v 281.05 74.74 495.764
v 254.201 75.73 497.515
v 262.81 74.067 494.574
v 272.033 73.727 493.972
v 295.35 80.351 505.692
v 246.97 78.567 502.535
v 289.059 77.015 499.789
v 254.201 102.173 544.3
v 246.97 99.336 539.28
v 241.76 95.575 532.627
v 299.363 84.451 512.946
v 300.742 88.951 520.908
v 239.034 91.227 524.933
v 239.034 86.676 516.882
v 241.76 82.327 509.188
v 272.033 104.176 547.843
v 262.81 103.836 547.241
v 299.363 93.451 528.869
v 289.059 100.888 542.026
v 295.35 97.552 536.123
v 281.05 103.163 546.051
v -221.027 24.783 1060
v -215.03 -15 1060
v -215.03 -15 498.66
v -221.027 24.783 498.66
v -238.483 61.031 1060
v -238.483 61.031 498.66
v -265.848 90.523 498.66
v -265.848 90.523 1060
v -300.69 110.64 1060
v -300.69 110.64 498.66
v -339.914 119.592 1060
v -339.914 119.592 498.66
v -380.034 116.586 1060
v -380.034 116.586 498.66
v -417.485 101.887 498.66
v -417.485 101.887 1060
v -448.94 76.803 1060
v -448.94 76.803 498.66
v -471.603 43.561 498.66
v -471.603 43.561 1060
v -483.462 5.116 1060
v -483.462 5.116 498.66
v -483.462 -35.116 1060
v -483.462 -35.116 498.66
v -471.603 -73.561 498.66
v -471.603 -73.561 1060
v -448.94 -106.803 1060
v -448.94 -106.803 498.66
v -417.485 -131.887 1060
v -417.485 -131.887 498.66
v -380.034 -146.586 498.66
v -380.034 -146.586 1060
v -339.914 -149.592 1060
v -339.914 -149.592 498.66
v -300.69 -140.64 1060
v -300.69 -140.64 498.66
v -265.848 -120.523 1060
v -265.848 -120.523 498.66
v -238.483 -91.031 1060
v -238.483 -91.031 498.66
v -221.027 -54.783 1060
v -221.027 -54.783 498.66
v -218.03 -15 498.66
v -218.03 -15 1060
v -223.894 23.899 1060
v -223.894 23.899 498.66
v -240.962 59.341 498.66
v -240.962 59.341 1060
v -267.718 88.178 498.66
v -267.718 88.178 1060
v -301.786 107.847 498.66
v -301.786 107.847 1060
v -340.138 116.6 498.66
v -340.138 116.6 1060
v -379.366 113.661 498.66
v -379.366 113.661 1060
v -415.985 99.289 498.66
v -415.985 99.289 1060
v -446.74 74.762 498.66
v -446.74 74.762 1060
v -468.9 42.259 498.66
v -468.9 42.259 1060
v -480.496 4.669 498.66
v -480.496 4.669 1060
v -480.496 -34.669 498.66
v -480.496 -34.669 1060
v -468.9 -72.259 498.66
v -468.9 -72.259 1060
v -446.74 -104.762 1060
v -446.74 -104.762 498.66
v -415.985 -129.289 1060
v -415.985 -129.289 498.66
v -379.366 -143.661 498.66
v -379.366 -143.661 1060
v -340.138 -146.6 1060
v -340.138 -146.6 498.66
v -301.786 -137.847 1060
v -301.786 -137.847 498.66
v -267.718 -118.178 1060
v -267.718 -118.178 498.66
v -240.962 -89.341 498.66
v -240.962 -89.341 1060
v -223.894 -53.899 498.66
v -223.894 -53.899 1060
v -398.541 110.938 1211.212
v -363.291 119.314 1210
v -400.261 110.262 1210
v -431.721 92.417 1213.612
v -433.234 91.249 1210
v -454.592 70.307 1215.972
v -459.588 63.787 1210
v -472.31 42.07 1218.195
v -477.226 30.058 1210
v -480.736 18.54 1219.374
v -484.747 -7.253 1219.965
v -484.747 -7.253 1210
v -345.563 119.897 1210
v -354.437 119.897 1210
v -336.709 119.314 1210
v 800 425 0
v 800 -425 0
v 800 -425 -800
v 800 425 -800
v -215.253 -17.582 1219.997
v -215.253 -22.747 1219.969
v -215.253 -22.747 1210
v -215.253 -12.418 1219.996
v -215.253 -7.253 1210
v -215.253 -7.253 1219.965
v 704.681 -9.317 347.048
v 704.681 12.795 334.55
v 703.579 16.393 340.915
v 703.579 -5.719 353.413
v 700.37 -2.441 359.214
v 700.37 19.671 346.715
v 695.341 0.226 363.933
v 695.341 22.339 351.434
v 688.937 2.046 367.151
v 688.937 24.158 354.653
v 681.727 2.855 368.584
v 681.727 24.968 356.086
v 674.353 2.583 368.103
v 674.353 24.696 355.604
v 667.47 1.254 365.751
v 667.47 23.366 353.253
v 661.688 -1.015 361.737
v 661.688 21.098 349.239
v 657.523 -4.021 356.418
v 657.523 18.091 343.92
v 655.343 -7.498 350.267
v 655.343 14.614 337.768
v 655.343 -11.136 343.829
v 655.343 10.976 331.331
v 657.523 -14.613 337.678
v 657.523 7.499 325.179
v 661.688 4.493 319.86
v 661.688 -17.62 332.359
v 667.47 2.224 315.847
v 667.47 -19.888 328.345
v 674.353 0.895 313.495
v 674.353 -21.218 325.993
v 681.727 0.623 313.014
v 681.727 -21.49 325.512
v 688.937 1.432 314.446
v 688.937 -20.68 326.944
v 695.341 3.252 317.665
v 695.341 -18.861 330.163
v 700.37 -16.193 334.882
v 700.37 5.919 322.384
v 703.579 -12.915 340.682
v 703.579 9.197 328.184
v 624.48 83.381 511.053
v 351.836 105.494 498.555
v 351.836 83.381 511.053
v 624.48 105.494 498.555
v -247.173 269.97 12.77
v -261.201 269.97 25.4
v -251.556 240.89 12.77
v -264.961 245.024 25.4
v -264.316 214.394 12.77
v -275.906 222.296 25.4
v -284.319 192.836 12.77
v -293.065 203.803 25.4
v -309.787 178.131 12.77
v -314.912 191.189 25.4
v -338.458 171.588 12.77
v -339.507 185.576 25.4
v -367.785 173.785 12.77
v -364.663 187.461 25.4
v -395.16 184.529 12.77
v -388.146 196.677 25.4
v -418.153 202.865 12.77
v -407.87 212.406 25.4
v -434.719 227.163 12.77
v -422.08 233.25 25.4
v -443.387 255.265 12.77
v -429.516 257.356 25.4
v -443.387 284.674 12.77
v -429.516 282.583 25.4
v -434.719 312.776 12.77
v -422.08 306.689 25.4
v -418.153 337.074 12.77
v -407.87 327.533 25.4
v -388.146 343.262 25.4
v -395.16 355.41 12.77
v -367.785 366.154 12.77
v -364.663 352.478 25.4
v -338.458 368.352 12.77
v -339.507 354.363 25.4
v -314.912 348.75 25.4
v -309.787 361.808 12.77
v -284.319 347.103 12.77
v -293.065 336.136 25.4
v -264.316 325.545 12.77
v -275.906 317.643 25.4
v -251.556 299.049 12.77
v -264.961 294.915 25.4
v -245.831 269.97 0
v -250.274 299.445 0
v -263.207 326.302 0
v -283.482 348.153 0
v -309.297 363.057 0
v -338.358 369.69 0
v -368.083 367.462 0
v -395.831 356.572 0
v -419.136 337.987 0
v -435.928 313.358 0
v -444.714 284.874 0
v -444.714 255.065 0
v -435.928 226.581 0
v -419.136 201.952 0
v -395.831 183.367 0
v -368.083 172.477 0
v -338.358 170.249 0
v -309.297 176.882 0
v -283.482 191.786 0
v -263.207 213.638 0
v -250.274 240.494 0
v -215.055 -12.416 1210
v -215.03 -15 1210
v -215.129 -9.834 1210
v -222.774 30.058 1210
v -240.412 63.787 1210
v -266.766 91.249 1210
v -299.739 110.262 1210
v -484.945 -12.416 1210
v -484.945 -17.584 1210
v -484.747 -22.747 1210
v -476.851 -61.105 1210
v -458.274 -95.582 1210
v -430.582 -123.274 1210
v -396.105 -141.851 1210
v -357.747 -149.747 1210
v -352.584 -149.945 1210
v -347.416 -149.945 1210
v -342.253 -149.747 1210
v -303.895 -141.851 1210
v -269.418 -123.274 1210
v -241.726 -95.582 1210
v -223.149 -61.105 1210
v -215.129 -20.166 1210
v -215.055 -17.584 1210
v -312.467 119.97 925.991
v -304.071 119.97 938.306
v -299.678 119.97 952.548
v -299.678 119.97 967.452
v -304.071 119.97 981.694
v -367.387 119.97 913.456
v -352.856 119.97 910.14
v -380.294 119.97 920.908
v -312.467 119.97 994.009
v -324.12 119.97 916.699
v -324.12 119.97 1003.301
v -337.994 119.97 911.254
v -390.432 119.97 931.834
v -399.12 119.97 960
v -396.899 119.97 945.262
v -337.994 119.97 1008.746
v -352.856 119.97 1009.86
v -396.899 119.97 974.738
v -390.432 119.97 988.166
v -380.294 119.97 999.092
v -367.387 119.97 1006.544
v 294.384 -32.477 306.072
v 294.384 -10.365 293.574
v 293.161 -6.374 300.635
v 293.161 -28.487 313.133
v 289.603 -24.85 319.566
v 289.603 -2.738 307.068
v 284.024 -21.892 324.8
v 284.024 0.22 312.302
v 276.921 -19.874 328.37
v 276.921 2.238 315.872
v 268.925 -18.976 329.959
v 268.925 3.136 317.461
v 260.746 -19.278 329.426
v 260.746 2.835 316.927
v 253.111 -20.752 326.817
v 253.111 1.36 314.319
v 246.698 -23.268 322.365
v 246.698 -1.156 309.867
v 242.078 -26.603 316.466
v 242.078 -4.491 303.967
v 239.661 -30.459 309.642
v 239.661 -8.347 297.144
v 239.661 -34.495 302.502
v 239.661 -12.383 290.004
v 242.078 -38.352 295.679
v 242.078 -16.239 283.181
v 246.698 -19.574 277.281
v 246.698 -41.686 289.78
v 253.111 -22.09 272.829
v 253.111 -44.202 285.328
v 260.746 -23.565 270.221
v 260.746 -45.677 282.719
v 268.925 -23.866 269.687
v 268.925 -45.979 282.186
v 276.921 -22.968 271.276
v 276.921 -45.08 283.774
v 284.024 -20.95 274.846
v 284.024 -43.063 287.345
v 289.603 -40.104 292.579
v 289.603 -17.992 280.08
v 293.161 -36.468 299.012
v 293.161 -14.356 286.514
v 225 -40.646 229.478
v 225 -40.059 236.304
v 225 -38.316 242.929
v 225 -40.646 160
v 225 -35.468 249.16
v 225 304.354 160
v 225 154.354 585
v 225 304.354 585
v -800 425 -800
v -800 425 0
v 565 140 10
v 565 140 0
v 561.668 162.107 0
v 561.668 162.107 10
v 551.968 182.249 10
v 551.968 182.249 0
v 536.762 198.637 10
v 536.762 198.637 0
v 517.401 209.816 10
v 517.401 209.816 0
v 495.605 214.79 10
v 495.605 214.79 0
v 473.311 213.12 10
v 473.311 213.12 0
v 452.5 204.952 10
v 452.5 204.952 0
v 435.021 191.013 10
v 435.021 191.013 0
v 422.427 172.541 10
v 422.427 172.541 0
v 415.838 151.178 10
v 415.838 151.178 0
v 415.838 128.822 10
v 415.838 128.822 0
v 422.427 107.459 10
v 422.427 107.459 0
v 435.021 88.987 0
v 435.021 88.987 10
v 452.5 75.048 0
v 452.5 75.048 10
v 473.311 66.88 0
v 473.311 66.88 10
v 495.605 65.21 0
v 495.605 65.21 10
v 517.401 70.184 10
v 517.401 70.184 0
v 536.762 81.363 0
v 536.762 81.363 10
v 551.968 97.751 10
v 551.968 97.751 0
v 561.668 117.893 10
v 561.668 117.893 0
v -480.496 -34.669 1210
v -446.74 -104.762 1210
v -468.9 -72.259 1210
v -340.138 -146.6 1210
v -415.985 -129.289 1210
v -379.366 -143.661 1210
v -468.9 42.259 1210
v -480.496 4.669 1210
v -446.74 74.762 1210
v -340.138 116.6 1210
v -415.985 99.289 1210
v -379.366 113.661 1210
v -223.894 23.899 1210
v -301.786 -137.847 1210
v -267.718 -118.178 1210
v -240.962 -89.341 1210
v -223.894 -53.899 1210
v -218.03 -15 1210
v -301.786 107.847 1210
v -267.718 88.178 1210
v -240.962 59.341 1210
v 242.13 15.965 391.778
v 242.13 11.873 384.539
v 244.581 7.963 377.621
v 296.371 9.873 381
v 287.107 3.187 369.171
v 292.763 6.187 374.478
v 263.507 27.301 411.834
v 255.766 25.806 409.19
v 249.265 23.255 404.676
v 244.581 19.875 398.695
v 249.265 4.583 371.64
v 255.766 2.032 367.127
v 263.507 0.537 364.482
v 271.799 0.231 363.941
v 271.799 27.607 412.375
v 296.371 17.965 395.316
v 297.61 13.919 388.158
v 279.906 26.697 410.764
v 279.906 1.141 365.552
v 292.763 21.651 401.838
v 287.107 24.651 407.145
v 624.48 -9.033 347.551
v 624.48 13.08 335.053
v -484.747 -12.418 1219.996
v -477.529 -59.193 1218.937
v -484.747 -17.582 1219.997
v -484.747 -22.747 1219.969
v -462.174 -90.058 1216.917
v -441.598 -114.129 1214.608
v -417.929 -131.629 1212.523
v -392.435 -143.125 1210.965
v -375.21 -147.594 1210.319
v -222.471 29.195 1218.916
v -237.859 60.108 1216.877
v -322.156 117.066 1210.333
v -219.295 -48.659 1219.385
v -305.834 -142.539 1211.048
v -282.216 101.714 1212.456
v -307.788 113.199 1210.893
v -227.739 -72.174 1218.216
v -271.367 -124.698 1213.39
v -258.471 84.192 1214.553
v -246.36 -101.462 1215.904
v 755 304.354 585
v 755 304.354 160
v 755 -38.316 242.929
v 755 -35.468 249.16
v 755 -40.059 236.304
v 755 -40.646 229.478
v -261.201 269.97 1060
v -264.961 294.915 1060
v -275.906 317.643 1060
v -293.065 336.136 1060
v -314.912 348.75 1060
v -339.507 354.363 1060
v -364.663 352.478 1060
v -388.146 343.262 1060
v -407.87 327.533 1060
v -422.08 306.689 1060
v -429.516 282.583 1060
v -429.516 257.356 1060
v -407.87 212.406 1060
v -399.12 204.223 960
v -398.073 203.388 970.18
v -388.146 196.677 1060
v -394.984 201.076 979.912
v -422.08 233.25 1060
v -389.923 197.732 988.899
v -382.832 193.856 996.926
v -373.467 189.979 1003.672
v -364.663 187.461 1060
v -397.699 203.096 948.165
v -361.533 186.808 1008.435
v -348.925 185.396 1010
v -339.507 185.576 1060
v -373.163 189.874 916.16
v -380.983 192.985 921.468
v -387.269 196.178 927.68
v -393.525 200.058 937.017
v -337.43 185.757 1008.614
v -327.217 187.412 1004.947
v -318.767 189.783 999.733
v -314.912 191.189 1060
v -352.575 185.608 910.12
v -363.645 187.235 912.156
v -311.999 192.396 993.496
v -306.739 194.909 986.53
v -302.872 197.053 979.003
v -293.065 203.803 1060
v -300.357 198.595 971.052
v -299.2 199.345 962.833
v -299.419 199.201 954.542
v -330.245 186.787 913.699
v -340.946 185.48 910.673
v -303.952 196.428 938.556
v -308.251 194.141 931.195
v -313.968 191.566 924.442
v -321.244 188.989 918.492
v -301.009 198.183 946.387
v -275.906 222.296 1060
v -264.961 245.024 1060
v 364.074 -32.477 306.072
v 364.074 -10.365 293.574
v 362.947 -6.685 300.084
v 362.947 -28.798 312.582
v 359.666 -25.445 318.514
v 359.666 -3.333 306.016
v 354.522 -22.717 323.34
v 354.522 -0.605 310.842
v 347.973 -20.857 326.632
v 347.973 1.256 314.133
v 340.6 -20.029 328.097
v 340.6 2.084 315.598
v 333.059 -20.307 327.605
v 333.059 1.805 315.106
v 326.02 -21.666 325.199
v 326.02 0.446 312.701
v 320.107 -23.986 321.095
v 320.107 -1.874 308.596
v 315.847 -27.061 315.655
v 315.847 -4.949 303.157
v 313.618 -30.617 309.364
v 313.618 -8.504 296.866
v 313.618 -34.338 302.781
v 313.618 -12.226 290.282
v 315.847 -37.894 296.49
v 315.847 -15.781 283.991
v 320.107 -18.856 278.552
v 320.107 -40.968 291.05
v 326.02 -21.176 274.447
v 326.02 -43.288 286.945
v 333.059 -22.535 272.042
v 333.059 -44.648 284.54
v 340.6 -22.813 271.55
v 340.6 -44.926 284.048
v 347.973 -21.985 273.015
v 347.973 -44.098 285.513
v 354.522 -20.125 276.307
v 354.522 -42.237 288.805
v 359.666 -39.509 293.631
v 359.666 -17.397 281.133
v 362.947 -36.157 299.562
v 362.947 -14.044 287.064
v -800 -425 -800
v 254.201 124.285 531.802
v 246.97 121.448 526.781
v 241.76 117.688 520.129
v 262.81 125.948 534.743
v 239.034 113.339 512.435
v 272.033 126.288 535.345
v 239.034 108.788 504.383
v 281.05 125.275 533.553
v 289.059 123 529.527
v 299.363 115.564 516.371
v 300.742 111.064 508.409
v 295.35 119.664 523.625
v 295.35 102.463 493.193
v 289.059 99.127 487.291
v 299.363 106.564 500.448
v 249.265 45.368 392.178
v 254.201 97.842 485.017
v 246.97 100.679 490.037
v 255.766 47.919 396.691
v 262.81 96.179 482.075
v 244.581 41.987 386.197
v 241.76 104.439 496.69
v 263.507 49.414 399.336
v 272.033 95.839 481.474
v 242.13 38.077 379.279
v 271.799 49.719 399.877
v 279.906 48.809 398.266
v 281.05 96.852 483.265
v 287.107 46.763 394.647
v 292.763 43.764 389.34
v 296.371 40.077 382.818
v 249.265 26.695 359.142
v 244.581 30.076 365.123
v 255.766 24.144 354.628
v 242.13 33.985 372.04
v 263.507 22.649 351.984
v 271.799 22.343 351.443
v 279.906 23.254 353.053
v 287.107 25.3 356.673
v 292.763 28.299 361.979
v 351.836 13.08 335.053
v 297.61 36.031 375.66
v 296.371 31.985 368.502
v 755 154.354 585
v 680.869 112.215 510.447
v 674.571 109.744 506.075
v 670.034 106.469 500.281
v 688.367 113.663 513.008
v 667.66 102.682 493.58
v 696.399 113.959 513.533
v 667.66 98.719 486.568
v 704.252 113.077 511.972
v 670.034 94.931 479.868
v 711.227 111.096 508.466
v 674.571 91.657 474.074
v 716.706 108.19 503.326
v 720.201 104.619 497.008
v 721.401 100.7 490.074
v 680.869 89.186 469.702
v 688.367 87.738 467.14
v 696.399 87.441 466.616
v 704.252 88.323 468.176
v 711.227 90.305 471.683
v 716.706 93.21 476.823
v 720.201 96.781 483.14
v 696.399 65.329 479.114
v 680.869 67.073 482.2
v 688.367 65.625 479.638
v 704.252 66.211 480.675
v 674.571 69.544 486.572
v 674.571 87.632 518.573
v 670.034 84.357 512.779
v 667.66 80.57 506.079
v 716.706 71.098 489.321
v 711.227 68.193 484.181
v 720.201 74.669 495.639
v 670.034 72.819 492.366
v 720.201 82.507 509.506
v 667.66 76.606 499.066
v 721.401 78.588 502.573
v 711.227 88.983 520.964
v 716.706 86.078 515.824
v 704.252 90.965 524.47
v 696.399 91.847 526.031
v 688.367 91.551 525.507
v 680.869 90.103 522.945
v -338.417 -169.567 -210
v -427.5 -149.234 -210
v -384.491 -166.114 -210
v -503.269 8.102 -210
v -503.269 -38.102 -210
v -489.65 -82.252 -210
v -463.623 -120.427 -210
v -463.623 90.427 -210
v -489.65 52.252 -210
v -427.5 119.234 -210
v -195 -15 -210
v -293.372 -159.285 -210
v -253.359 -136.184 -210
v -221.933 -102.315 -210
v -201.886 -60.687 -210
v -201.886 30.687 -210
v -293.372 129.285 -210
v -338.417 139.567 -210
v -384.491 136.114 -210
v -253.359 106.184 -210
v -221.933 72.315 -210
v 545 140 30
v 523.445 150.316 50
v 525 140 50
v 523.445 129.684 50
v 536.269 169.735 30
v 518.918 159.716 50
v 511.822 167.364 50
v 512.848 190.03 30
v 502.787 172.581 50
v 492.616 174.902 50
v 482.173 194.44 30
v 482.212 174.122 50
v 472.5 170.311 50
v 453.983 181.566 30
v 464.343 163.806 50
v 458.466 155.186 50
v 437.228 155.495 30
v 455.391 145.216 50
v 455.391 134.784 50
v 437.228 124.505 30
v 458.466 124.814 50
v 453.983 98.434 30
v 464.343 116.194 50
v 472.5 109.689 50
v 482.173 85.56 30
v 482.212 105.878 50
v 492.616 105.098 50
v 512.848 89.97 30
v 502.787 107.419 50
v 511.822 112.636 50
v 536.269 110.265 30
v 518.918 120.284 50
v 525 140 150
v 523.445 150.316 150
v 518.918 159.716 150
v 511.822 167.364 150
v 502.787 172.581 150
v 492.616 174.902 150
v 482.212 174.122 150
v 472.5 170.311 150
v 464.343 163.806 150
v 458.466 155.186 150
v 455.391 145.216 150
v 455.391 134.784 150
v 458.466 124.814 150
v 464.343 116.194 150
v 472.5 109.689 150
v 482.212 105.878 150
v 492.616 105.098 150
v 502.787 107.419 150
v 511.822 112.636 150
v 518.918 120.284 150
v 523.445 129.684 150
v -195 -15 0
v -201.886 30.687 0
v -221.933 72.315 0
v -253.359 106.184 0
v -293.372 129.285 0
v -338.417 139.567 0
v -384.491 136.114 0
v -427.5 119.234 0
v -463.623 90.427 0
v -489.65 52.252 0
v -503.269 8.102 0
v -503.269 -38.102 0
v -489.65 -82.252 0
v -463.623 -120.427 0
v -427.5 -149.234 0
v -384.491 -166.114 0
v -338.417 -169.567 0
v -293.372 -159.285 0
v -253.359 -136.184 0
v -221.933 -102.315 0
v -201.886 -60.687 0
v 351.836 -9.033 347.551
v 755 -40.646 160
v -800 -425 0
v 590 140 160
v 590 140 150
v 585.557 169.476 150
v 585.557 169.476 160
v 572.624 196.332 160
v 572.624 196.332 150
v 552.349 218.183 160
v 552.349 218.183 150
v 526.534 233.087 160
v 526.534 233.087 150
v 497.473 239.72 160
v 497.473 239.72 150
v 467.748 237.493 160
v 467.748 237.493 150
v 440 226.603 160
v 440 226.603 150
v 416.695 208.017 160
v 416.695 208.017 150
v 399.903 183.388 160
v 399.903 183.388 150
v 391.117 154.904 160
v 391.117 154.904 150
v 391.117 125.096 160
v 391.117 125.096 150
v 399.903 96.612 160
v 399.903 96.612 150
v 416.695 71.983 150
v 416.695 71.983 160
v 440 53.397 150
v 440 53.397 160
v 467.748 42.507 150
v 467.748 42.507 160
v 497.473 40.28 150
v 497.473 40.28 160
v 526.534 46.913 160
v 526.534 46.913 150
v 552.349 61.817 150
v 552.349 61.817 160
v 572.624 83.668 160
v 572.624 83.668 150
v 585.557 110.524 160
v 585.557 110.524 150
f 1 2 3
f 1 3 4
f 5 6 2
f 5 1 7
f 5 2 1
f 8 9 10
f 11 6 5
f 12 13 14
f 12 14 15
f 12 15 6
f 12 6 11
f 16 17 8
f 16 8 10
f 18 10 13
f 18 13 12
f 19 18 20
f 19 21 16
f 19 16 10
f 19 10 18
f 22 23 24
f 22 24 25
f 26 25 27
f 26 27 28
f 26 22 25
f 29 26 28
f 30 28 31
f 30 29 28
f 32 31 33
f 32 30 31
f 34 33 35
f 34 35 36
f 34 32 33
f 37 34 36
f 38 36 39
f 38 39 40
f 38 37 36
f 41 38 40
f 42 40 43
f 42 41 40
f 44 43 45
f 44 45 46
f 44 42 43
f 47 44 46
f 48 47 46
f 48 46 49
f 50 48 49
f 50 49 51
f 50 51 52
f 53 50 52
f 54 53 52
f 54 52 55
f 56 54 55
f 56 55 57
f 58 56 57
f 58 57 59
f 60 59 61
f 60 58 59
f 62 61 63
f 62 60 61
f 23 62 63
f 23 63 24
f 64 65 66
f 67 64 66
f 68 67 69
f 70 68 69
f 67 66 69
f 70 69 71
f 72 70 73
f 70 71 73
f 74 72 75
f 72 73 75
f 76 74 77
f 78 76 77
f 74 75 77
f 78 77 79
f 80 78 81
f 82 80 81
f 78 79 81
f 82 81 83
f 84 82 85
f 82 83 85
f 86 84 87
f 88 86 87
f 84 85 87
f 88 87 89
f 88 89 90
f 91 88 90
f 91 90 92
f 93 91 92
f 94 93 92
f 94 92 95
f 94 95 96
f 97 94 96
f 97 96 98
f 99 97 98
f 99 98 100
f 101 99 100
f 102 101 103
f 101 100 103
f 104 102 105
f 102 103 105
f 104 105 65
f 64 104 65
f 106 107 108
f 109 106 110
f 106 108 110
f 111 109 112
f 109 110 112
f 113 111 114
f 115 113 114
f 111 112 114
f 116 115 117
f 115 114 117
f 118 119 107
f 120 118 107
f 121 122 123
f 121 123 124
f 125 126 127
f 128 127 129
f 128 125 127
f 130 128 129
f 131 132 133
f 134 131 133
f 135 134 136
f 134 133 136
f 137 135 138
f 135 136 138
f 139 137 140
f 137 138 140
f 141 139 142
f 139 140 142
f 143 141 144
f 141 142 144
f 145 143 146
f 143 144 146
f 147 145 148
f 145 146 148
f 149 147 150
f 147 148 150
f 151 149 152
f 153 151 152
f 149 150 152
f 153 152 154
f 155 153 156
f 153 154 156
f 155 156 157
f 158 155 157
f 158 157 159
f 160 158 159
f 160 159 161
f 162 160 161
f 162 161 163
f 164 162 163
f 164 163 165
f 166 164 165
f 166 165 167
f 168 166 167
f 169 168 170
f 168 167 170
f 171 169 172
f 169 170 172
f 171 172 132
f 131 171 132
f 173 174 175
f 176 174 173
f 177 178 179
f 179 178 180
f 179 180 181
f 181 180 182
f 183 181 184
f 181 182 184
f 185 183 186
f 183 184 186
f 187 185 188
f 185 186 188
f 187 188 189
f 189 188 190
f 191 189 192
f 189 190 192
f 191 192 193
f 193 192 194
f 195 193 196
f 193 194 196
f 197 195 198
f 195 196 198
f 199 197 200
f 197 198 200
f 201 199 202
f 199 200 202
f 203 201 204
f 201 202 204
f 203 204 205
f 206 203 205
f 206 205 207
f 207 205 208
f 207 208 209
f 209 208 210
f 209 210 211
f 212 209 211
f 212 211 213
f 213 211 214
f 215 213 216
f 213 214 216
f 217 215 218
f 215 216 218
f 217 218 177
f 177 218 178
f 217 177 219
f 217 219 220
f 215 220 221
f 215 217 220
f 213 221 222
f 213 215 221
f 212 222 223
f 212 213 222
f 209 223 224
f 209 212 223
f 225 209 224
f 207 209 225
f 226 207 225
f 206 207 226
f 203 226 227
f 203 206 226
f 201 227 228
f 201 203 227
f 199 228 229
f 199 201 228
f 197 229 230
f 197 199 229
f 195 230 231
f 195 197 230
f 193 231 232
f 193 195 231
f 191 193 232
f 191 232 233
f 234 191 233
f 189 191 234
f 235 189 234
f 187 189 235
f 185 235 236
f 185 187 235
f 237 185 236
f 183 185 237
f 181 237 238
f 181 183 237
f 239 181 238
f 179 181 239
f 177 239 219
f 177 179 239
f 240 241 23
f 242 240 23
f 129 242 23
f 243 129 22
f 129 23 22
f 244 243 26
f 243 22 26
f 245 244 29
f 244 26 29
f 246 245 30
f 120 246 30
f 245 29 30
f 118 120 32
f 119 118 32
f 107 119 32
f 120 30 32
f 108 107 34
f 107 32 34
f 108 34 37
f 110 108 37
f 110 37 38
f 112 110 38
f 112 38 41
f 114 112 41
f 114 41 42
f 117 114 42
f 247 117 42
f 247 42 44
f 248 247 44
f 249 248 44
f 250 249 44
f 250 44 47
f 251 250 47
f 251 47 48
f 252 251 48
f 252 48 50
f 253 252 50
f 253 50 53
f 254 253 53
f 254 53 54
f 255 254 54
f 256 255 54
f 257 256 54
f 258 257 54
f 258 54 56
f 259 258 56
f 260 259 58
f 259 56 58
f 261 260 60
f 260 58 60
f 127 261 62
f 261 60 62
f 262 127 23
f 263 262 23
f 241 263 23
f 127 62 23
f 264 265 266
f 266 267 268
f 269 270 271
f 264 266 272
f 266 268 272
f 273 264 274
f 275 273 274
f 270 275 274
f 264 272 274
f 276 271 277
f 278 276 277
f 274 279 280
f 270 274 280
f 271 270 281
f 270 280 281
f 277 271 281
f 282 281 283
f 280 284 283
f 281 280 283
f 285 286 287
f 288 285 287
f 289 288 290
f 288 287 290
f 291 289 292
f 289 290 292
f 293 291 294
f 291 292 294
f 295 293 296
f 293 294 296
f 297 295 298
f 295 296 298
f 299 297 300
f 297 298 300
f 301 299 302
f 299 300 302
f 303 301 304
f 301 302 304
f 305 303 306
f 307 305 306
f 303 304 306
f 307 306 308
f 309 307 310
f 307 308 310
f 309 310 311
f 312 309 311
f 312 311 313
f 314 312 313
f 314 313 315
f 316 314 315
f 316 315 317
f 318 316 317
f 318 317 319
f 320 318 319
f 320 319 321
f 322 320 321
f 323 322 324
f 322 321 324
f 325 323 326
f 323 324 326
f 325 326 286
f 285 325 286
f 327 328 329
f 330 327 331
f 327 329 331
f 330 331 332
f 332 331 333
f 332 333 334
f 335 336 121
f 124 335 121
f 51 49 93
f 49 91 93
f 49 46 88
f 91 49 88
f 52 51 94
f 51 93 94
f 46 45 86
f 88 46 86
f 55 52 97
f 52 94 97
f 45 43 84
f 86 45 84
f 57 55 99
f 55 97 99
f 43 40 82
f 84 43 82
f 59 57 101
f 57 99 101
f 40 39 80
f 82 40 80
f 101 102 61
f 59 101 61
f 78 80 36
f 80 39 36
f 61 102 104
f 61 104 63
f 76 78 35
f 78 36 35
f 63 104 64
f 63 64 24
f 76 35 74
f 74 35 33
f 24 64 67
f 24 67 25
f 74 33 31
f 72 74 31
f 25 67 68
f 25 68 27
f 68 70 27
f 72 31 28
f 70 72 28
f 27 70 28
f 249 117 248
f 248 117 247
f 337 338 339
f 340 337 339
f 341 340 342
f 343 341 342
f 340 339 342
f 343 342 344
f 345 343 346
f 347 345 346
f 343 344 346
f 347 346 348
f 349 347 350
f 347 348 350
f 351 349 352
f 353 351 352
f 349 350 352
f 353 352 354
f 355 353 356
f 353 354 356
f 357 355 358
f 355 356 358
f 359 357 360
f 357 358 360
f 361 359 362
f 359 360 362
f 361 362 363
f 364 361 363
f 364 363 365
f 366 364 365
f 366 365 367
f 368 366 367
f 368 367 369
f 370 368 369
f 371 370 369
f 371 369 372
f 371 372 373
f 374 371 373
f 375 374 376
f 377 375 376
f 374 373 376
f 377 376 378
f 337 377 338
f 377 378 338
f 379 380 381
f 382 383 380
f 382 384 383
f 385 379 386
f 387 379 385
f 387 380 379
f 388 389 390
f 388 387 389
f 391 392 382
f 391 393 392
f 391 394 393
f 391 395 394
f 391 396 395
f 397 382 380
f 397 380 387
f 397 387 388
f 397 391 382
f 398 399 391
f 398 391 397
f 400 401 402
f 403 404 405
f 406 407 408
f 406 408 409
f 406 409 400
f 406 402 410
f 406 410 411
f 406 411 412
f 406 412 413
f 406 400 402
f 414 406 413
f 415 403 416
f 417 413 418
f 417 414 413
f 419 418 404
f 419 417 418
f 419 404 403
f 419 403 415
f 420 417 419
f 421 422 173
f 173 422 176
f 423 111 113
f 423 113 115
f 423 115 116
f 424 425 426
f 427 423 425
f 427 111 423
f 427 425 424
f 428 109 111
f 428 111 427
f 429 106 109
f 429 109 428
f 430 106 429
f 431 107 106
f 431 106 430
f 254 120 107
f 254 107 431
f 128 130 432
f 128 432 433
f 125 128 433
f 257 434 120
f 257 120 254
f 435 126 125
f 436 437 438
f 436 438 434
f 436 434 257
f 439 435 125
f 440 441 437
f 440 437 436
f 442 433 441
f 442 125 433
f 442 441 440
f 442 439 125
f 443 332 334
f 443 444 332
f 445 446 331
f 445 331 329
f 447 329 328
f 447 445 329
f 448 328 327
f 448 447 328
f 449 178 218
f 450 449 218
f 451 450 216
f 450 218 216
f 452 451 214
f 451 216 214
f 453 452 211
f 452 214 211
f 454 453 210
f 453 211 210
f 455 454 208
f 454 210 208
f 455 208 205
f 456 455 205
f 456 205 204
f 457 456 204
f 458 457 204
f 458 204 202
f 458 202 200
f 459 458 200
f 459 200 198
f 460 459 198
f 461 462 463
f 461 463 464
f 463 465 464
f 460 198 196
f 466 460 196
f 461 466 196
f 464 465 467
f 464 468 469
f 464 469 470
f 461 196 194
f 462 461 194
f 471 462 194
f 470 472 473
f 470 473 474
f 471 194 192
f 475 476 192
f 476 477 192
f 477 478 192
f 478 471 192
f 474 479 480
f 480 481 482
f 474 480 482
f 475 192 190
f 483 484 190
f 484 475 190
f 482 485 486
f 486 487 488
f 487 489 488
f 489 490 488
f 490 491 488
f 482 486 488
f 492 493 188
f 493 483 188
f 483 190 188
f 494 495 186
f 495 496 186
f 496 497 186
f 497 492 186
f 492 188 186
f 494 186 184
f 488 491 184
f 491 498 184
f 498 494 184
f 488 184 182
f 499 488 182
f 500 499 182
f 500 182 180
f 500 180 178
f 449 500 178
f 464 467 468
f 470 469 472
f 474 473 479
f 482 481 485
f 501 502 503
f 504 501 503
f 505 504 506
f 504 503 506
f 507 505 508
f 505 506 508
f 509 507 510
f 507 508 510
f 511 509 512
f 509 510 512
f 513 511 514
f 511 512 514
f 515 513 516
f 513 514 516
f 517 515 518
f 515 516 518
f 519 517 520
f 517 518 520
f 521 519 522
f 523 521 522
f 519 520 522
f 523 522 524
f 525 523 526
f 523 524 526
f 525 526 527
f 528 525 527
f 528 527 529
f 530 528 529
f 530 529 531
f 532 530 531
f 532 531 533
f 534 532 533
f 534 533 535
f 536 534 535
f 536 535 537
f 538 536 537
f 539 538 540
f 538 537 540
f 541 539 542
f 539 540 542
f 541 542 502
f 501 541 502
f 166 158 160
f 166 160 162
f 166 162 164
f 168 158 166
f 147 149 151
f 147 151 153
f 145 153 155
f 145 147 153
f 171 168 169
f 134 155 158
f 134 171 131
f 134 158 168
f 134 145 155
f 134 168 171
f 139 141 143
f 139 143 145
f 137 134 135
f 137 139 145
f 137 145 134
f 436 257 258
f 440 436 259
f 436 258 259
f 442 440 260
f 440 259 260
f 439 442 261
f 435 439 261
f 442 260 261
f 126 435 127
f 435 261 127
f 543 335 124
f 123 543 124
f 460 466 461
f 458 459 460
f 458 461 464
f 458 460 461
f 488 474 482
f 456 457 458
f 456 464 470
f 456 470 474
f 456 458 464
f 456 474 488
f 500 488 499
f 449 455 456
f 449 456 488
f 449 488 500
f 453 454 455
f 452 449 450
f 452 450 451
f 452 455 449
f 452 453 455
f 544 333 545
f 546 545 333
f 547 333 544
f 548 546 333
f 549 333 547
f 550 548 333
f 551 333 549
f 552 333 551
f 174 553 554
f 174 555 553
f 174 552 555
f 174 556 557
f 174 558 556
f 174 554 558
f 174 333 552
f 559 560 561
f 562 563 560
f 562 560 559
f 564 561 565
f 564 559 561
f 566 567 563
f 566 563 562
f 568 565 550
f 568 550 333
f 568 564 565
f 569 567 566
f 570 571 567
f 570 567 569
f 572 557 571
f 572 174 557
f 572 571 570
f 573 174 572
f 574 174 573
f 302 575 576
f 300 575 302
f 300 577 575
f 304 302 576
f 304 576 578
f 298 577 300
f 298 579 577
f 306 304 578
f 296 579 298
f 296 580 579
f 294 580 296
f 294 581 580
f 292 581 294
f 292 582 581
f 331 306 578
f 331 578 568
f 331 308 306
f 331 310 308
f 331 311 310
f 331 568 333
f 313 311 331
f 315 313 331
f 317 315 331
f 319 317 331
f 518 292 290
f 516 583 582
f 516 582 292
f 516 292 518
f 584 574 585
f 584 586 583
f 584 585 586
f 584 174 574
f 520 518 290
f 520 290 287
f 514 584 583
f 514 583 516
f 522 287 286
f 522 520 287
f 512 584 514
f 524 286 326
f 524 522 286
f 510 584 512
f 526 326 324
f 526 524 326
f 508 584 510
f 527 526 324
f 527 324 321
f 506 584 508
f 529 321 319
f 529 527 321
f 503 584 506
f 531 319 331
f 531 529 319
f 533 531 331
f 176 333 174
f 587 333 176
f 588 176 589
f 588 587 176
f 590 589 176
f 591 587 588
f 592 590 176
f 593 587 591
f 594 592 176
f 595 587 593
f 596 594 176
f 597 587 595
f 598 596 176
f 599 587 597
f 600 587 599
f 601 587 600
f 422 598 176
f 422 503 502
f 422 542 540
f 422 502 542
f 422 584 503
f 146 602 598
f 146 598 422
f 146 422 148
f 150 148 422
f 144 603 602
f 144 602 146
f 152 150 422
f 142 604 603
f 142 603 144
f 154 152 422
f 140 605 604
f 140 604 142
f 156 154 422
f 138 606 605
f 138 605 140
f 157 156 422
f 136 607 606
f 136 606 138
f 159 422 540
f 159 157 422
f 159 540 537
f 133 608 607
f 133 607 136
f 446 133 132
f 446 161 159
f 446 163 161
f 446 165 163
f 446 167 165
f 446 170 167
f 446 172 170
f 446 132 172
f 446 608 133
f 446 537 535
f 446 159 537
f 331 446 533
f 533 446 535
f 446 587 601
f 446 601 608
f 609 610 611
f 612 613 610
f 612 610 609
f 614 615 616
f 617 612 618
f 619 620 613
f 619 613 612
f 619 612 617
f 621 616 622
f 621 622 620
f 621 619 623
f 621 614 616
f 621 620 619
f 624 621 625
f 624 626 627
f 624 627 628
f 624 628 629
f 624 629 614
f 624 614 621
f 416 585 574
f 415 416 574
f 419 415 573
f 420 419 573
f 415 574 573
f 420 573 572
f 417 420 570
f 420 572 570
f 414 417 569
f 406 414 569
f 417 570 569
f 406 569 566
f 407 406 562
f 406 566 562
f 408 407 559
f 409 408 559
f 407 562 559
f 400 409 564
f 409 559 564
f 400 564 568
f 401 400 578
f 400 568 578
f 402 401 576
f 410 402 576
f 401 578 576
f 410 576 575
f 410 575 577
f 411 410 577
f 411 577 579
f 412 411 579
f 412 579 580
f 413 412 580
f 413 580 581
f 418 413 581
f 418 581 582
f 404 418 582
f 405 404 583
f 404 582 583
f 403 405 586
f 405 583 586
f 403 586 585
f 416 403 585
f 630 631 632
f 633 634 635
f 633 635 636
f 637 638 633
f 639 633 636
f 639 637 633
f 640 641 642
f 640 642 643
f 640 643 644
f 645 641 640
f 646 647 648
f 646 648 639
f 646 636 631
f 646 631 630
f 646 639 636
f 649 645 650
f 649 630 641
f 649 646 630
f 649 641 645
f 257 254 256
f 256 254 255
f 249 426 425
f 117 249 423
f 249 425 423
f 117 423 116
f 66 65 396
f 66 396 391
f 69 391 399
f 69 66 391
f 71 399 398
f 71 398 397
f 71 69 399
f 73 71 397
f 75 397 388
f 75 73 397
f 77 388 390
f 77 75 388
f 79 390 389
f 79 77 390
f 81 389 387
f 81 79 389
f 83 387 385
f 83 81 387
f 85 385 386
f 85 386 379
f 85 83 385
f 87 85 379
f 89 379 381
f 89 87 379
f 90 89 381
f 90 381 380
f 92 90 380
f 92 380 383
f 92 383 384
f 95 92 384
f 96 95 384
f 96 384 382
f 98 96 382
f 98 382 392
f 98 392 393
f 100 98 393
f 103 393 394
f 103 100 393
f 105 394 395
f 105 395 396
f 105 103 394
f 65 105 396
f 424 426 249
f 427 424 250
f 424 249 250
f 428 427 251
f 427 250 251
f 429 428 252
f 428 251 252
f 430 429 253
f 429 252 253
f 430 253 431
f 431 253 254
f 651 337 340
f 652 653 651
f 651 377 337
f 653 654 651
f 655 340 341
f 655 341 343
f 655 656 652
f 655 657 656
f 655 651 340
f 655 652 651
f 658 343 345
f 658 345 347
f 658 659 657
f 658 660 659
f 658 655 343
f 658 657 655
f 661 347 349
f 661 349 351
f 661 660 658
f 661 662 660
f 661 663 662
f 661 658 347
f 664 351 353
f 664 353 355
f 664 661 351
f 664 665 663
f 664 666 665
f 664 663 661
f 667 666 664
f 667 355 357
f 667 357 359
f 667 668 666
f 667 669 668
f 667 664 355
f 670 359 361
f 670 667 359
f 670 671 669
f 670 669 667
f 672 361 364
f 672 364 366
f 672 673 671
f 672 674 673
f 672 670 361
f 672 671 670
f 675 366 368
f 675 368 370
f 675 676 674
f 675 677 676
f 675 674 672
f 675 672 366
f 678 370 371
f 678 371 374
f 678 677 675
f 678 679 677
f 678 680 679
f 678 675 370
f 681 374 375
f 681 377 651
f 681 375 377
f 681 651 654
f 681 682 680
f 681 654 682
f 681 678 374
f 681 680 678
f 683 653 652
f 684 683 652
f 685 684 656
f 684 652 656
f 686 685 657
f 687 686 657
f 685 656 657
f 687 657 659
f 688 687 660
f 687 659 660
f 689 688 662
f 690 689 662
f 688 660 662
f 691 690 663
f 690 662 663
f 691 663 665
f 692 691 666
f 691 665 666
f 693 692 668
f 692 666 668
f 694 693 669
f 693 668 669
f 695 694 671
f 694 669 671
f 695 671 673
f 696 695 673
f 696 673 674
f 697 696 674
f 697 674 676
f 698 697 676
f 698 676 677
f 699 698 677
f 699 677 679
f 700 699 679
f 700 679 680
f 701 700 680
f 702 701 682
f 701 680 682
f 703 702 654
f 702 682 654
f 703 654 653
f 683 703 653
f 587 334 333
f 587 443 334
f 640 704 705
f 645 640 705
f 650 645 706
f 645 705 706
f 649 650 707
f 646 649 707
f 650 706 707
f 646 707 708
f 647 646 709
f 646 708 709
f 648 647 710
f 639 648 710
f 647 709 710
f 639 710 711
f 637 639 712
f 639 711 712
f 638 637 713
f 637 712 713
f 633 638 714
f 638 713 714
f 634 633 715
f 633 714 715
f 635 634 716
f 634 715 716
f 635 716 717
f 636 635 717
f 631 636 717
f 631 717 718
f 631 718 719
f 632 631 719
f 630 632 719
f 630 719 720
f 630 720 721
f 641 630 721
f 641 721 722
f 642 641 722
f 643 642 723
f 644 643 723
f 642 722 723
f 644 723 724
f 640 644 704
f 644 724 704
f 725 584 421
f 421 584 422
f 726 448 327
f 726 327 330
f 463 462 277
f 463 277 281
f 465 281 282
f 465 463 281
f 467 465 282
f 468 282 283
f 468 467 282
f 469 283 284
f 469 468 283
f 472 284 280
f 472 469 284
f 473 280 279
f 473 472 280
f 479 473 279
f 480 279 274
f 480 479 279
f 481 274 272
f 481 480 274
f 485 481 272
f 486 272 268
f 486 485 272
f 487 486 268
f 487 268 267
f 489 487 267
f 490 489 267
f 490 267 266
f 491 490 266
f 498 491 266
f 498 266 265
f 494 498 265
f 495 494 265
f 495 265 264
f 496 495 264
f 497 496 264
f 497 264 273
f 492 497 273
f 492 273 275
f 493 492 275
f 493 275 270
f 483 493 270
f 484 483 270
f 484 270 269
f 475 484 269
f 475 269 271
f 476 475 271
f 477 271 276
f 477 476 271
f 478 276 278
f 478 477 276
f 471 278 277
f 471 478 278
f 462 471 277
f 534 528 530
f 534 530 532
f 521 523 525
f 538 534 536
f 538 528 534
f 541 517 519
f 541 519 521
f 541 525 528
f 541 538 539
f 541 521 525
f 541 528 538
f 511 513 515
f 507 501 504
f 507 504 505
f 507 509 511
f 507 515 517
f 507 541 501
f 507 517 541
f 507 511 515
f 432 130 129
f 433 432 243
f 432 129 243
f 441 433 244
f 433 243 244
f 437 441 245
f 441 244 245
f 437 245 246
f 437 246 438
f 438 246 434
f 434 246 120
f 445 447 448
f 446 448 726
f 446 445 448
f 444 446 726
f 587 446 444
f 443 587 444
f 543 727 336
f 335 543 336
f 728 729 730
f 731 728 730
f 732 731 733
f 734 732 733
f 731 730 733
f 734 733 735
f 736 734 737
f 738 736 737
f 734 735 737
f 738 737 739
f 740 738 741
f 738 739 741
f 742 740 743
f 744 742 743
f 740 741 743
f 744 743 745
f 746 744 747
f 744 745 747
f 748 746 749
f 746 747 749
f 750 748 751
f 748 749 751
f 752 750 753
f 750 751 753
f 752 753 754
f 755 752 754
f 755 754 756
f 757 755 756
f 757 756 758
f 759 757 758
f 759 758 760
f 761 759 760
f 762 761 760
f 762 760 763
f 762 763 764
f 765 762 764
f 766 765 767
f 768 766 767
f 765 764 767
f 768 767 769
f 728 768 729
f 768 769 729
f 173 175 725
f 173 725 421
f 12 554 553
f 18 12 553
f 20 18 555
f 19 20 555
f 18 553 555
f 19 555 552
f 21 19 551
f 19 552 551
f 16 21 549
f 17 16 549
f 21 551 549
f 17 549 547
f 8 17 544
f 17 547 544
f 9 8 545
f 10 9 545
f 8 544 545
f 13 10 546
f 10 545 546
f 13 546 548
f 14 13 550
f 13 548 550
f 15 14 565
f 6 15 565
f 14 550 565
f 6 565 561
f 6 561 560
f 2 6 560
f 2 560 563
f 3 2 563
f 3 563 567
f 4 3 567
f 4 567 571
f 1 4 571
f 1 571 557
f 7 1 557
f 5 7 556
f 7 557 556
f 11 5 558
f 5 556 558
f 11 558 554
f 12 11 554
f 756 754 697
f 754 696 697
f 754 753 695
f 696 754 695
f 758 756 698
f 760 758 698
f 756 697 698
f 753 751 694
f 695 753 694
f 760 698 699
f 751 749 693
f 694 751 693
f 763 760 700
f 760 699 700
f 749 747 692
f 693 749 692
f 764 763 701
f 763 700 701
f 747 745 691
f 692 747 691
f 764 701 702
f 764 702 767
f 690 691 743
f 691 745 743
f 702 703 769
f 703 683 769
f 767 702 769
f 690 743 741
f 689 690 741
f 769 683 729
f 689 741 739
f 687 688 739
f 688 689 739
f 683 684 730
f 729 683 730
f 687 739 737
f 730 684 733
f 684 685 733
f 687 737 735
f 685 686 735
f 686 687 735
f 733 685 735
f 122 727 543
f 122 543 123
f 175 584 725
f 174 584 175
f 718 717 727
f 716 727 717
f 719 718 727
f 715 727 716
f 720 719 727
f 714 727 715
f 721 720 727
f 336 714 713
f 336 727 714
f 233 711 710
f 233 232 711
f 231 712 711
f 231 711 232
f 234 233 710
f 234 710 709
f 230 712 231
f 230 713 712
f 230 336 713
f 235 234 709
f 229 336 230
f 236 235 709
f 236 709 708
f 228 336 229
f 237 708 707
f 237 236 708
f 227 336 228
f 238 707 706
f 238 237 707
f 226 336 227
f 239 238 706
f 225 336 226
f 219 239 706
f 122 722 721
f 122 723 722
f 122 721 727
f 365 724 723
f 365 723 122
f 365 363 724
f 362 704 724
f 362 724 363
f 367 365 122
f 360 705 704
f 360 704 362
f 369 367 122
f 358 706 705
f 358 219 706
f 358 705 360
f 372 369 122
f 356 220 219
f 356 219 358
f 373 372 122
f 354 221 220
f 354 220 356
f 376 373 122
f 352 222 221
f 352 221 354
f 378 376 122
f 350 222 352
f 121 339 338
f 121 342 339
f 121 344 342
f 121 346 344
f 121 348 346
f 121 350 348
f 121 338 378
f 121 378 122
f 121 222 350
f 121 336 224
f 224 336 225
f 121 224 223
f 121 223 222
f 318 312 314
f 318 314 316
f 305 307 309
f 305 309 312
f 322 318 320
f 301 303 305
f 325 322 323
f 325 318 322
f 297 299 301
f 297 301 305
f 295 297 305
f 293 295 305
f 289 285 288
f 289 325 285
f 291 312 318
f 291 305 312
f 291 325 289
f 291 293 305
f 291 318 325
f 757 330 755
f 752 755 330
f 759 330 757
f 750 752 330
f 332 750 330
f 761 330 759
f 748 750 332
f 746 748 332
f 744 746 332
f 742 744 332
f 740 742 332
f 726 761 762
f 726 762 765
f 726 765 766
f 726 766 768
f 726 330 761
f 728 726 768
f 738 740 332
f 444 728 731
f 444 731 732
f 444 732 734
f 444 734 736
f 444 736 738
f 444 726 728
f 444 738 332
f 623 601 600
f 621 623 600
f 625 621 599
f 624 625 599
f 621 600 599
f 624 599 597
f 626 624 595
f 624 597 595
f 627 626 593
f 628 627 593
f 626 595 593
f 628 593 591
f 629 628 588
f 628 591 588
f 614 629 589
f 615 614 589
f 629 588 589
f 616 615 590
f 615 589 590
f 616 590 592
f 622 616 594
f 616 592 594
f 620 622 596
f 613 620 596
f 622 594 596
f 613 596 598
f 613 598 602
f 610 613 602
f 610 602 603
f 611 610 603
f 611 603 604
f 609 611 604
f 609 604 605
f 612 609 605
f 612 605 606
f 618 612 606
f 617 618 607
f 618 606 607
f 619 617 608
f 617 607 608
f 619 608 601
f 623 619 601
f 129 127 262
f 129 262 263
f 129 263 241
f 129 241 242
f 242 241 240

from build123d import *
from build123d import SkipClean  # not in build123d's __all__

# Parameters (mm, degrees)
F0_W      = 1600
F0_H      = 850
F1_DEPTH  = 800
F2_R      = 155
F3_DEPTH  = 210
F4_R      = 100
F5_DEPTH  = 25.4
F5_TAPER  = 6
F7_R      = 84.6303524243
F8_DEPTH  = 1034.6
F9_R      = 75
F10_DEPTH = 50
F11_SIZE  = 40
F12_R     = 35
F13_DEPTH = 100
F14_R     = 100
F15_DEPTH = 10
F18_DEPTH = 265
F20_R     = 50
F21_DEPTH = 150
F22_R     = 134.9695088885
F22_R_2   = 131.9695088885
F23_DEPTH = 561.34
F24_R     = 134.9695088885
F24_R_2   = 131.9695088885
F25_DEPTH = 150
F28_DEPTH = 134.747
F30_DEPTH = 25.4
F32_DEPTH = 25.4
F34_DEPTH = 25.4
F36_DEPTH = 25.4
F37_R     = 31.0271964064
F37_R_2   = 27.8958895213
F37_R_3   = 27.5153110401
F37_R_4   = 25.3697871684
F37_R_5   = 27.0215738096
F37_R_6   = 24.8073241301
F37_W     = 272.6435363293
F37_H     = 187.8117322922
F38_DEPTH = 25.4


# Not quite as in the source:
# - a fillet or chamfer that OpenCascade refuses, or shapes differently, is made with other operations: its cross-section is extruded or revolved along the edge and cut away or added


with BuildPart() as f1:
    # F0 (on Top) → F1 (new body)
    with BuildSketch(Plane.XY):
        Rectangle(F0_W, F0_H)
    extrude(amount=-F1_DEPTH)

    # F2 (on face) → F3 (cut)
    with BuildSketch(Plane.XY):
        with Locations((-350, -15)):
            Circle(F2_R)
    extrude(amount=-F3_DEPTH, mode=Mode.SUBTRACT)

    # F4 (on face) → F5 (join)
    with BuildSketch(Plane.XY):
        with Locations((-345.8311867569, 269.9695088885)):
            Circle(F4_R)
    extrude(amount=F5_DEPTH, taper=F5_TAPER)

    # F6: chamfer of 12.7 on 1 edges, made by hand

    # F6_s1 → F6_t2 (revolve, cut)
    with BuildSketch(Plane.XZ.offset(-269.9695088885)):
        Polygon((-247.1733228492, 12.7695719288), (-261.2008343327, 25.4), (-248.5008343327, 25.4), align=None)
    revolve(axis=Axis((-345.8311867569, 269.9695088885, 25.4), (0, 0, -1)), mode=Mode.SUBTRACT)

    # F7 (on face) → F8 (join)
    with BuildSketch(Plane.XY.offset(25.4)):
        with Locations((-345.8311867569, 269.9695088885)):
            Circle(F7_R)
    extrude(amount=F8_DEPTH)

    # F9 (on face) → F10 (join)
    with BuildSketch(Plane.XY):
        with Locations((490, 140)):
            Circle(F9_R)
    extrude(amount=F10_DEPTH)

    # F11
    f11_edges = [f1.edges().sort_by_distance(p)[0] for p in [
        (415, 140, 50),
    ]]
    chamfer(f11_edges, length=F11_SIZE)

    # F12 (on face) → F13 (join)
    with BuildSketch(Plane.XY.offset(50)):
        with Locations((490, 140)):
            Circle(F12_R)
    extrude(amount=F13_DEPTH)

    # F14 (on face) → F15 (join)
    with BuildSketch(Plane.XY.offset(150)):
        with Locations((490, 140)):
            Circle(F14_R)
    extrude(amount=F15_DEPTH)

    # F17 (on face) → F18 (join, symmetric)
    with BuildSketch(Plane.YZ.offset(490)):
        with BuildLine():
            Line((304.3540355563, 585), (154.3540355563, 585))
            Line((154.3540355563, 585), (-35.4684779925, 249.1601683367))
            ThreePointArc((-35.4684779925, 249.1601683367), (-39.3299439569, 239.6538167994), (-40.6459644437, 229.47787807))
            Line((-40.6459644437, 229.47787807), (-40.6459644437, 160))
            Line((-40.6459644437, 160), (304.3540355563, 160))
            Line((304.3540355563, 160), (304.3540355563, 585))
        make_face()
    extrude(amount=F18_DEPTH, both=True)

    # F20 (on face) → F21 (join)
    with BuildSketch(Plane(origin=(0, 269.9695088885, 0), x_dir=(-1, 0, 0), z_dir=(0, 1, 0))):
        with Locations((349.1199016571, 960)):
            Circle(F20_R)
    extrude(amount=-F21_DEPTH)

    # F37 (on face) → F38 (join)
    with BuildSketch(Plane(origin=(0, -133.6127724795, 75.5202627058), x_dir=(1, 0, 0), z_dir=(0, -0.8705628387, 0.4920572567))):
        with Locations((269.7143256664, 497.251868248)):
            Circle(F37_R)
        with Locations((269.7143256664, 344.7649217223)):
            Circle(F37_R_2)
        with Locations((266.8685615063, 250.4745423794)):
            Circle(F37_R_3)
        with Locations((338.7044257195, 250.4745423794)):
            Circle(F37_R_4)
        with Locations((694.3796277046, 476.1908352375)):
            Circle(F37_R_5)
        with Locations((679.8734068871, 297.5423932076)):
            Circle(F37_R_6)
        with Locations((488.1581813097, 392.0264542103)):
            Rectangle(F37_W, F37_H)
    extrude(amount=F38_DEPTH)


with BuildPart() as f23:
    # F22 (on face) → F23 (new body)
    with BuildSketch(Plane.XY.offset(1060)):
        with Locations((-350, -15)):
            Circle(F22_R)
        with Locations((-350, -15)):
            Circle(F22_R_2, mode=Mode.SUBTRACT)
    extrude(amount=-F23_DEPTH)

    # F24 (on face) → F25 (join)
    with BuildSketch(Plane.XY.offset(1060)):
        with Locations((-350, -15)):
            Circle(F24_R)
        with Locations((-350, -15)):
            Circle(F24_R_2, mode=Mode.SUBTRACT)
    extrude(amount=F25_DEPTH)

    # F27 (on face) → F28 (join, symmetric)
    with BuildSketch(Plane.YZ.offset(-350)):
        with BuildLine():
            Line((-149.7469991446, 1210), (119.3135008216, 1210))
            ThreePointArc((119.3135008216, 1210), (-15.2167491615, 1220), (-149.7469991446, 1210))
        make_face()
    extrude(amount=F28_DEPTH, both=True)

    # F29 (on face) → F30 (cut)
    with BuildSketch(Plane(origin=(0, 0, 1210), x_dir=(1, 0, 0), z_dir=(0, 0, -1))):
        with BuildLine():
            Line((-484.747, 7.2531089721), (-484.747, -119.3135008216))
            Line((-484.747, -119.3135008216), (-363.2910430985, -119.3135008216))
            ThreePointArc((-363.2910430985, -119.3135008216), (-447.3837369881, -78.451463872), (-484.747, 7.2531089721))
        make_face()
    extrude(amount=-F30_DEPTH, mode=Mode.SUBTRACT)

    # F31 (on face) → F32 (cut)
    with BuildSketch(Plane(origin=(0, 0, 1210), x_dir=(1, 0, 0), z_dir=(0, 0, -1))):
        with BuildLine():
            Line((-357.7469059073, 149.7469991446), (-484.747, 149.7469991446))
            Line((-484.747, 149.7469991446), (-484.747, 22.7468910279))
            ThreePointArc((-484.747, 22.7468910279), (-445.4378602578, 110.4378497191), (-357.7469059073, 149.7469991446))
        make_face()
    extrude(amount=-F32_DEPTH, mode=Mode.SUBTRACT)

    # F33 (on face) → F34 (cut)
    with BuildSketch(Plane(origin=(0, 0, 1210), x_dir=(1, 0, 0), z_dir=(0, 0, -1))):
        with BuildLine():
            Line((-336.7089569015, -119.3135008216), (-215.253, -119.3135008216))
            Line((-215.253, -119.3135008216), (-215.253, 7.2531089721))
            ThreePointArc((-215.253, 7.2531089721), (-252.6162630119, -78.451463872), (-336.7089569015, -119.3135008216))
        make_face()
    extrude(amount=-F34_DEPTH, mode=Mode.SUBTRACT)

    # F35 (on face) → F36 (cut)
    with BuildSketch(Plane(origin=(0, 0, 1210), x_dir=(1, 0, 0), z_dir=(0, 0, -1))):
        with BuildLine():
            Line((-215.253, 22.7468910279), (-215.253, 149.7469991446))
            Line((-215.253, 149.7469991446), (-342.2530940927, 149.7469991446))
            ThreePointArc((-342.2530940927, 149.7469991446), (-254.5621397422, 110.4378497191), (-215.253, 22.7468910279))
        make_face()
    with SkipClean():  # cleaning this boolean's faces spoils the solid; the shape is the same uncleaned
        extrude(amount=-F36_DEPTH, mode=Mode.SUBTRACT)


solid = Compound([f1.part, f23.part])
